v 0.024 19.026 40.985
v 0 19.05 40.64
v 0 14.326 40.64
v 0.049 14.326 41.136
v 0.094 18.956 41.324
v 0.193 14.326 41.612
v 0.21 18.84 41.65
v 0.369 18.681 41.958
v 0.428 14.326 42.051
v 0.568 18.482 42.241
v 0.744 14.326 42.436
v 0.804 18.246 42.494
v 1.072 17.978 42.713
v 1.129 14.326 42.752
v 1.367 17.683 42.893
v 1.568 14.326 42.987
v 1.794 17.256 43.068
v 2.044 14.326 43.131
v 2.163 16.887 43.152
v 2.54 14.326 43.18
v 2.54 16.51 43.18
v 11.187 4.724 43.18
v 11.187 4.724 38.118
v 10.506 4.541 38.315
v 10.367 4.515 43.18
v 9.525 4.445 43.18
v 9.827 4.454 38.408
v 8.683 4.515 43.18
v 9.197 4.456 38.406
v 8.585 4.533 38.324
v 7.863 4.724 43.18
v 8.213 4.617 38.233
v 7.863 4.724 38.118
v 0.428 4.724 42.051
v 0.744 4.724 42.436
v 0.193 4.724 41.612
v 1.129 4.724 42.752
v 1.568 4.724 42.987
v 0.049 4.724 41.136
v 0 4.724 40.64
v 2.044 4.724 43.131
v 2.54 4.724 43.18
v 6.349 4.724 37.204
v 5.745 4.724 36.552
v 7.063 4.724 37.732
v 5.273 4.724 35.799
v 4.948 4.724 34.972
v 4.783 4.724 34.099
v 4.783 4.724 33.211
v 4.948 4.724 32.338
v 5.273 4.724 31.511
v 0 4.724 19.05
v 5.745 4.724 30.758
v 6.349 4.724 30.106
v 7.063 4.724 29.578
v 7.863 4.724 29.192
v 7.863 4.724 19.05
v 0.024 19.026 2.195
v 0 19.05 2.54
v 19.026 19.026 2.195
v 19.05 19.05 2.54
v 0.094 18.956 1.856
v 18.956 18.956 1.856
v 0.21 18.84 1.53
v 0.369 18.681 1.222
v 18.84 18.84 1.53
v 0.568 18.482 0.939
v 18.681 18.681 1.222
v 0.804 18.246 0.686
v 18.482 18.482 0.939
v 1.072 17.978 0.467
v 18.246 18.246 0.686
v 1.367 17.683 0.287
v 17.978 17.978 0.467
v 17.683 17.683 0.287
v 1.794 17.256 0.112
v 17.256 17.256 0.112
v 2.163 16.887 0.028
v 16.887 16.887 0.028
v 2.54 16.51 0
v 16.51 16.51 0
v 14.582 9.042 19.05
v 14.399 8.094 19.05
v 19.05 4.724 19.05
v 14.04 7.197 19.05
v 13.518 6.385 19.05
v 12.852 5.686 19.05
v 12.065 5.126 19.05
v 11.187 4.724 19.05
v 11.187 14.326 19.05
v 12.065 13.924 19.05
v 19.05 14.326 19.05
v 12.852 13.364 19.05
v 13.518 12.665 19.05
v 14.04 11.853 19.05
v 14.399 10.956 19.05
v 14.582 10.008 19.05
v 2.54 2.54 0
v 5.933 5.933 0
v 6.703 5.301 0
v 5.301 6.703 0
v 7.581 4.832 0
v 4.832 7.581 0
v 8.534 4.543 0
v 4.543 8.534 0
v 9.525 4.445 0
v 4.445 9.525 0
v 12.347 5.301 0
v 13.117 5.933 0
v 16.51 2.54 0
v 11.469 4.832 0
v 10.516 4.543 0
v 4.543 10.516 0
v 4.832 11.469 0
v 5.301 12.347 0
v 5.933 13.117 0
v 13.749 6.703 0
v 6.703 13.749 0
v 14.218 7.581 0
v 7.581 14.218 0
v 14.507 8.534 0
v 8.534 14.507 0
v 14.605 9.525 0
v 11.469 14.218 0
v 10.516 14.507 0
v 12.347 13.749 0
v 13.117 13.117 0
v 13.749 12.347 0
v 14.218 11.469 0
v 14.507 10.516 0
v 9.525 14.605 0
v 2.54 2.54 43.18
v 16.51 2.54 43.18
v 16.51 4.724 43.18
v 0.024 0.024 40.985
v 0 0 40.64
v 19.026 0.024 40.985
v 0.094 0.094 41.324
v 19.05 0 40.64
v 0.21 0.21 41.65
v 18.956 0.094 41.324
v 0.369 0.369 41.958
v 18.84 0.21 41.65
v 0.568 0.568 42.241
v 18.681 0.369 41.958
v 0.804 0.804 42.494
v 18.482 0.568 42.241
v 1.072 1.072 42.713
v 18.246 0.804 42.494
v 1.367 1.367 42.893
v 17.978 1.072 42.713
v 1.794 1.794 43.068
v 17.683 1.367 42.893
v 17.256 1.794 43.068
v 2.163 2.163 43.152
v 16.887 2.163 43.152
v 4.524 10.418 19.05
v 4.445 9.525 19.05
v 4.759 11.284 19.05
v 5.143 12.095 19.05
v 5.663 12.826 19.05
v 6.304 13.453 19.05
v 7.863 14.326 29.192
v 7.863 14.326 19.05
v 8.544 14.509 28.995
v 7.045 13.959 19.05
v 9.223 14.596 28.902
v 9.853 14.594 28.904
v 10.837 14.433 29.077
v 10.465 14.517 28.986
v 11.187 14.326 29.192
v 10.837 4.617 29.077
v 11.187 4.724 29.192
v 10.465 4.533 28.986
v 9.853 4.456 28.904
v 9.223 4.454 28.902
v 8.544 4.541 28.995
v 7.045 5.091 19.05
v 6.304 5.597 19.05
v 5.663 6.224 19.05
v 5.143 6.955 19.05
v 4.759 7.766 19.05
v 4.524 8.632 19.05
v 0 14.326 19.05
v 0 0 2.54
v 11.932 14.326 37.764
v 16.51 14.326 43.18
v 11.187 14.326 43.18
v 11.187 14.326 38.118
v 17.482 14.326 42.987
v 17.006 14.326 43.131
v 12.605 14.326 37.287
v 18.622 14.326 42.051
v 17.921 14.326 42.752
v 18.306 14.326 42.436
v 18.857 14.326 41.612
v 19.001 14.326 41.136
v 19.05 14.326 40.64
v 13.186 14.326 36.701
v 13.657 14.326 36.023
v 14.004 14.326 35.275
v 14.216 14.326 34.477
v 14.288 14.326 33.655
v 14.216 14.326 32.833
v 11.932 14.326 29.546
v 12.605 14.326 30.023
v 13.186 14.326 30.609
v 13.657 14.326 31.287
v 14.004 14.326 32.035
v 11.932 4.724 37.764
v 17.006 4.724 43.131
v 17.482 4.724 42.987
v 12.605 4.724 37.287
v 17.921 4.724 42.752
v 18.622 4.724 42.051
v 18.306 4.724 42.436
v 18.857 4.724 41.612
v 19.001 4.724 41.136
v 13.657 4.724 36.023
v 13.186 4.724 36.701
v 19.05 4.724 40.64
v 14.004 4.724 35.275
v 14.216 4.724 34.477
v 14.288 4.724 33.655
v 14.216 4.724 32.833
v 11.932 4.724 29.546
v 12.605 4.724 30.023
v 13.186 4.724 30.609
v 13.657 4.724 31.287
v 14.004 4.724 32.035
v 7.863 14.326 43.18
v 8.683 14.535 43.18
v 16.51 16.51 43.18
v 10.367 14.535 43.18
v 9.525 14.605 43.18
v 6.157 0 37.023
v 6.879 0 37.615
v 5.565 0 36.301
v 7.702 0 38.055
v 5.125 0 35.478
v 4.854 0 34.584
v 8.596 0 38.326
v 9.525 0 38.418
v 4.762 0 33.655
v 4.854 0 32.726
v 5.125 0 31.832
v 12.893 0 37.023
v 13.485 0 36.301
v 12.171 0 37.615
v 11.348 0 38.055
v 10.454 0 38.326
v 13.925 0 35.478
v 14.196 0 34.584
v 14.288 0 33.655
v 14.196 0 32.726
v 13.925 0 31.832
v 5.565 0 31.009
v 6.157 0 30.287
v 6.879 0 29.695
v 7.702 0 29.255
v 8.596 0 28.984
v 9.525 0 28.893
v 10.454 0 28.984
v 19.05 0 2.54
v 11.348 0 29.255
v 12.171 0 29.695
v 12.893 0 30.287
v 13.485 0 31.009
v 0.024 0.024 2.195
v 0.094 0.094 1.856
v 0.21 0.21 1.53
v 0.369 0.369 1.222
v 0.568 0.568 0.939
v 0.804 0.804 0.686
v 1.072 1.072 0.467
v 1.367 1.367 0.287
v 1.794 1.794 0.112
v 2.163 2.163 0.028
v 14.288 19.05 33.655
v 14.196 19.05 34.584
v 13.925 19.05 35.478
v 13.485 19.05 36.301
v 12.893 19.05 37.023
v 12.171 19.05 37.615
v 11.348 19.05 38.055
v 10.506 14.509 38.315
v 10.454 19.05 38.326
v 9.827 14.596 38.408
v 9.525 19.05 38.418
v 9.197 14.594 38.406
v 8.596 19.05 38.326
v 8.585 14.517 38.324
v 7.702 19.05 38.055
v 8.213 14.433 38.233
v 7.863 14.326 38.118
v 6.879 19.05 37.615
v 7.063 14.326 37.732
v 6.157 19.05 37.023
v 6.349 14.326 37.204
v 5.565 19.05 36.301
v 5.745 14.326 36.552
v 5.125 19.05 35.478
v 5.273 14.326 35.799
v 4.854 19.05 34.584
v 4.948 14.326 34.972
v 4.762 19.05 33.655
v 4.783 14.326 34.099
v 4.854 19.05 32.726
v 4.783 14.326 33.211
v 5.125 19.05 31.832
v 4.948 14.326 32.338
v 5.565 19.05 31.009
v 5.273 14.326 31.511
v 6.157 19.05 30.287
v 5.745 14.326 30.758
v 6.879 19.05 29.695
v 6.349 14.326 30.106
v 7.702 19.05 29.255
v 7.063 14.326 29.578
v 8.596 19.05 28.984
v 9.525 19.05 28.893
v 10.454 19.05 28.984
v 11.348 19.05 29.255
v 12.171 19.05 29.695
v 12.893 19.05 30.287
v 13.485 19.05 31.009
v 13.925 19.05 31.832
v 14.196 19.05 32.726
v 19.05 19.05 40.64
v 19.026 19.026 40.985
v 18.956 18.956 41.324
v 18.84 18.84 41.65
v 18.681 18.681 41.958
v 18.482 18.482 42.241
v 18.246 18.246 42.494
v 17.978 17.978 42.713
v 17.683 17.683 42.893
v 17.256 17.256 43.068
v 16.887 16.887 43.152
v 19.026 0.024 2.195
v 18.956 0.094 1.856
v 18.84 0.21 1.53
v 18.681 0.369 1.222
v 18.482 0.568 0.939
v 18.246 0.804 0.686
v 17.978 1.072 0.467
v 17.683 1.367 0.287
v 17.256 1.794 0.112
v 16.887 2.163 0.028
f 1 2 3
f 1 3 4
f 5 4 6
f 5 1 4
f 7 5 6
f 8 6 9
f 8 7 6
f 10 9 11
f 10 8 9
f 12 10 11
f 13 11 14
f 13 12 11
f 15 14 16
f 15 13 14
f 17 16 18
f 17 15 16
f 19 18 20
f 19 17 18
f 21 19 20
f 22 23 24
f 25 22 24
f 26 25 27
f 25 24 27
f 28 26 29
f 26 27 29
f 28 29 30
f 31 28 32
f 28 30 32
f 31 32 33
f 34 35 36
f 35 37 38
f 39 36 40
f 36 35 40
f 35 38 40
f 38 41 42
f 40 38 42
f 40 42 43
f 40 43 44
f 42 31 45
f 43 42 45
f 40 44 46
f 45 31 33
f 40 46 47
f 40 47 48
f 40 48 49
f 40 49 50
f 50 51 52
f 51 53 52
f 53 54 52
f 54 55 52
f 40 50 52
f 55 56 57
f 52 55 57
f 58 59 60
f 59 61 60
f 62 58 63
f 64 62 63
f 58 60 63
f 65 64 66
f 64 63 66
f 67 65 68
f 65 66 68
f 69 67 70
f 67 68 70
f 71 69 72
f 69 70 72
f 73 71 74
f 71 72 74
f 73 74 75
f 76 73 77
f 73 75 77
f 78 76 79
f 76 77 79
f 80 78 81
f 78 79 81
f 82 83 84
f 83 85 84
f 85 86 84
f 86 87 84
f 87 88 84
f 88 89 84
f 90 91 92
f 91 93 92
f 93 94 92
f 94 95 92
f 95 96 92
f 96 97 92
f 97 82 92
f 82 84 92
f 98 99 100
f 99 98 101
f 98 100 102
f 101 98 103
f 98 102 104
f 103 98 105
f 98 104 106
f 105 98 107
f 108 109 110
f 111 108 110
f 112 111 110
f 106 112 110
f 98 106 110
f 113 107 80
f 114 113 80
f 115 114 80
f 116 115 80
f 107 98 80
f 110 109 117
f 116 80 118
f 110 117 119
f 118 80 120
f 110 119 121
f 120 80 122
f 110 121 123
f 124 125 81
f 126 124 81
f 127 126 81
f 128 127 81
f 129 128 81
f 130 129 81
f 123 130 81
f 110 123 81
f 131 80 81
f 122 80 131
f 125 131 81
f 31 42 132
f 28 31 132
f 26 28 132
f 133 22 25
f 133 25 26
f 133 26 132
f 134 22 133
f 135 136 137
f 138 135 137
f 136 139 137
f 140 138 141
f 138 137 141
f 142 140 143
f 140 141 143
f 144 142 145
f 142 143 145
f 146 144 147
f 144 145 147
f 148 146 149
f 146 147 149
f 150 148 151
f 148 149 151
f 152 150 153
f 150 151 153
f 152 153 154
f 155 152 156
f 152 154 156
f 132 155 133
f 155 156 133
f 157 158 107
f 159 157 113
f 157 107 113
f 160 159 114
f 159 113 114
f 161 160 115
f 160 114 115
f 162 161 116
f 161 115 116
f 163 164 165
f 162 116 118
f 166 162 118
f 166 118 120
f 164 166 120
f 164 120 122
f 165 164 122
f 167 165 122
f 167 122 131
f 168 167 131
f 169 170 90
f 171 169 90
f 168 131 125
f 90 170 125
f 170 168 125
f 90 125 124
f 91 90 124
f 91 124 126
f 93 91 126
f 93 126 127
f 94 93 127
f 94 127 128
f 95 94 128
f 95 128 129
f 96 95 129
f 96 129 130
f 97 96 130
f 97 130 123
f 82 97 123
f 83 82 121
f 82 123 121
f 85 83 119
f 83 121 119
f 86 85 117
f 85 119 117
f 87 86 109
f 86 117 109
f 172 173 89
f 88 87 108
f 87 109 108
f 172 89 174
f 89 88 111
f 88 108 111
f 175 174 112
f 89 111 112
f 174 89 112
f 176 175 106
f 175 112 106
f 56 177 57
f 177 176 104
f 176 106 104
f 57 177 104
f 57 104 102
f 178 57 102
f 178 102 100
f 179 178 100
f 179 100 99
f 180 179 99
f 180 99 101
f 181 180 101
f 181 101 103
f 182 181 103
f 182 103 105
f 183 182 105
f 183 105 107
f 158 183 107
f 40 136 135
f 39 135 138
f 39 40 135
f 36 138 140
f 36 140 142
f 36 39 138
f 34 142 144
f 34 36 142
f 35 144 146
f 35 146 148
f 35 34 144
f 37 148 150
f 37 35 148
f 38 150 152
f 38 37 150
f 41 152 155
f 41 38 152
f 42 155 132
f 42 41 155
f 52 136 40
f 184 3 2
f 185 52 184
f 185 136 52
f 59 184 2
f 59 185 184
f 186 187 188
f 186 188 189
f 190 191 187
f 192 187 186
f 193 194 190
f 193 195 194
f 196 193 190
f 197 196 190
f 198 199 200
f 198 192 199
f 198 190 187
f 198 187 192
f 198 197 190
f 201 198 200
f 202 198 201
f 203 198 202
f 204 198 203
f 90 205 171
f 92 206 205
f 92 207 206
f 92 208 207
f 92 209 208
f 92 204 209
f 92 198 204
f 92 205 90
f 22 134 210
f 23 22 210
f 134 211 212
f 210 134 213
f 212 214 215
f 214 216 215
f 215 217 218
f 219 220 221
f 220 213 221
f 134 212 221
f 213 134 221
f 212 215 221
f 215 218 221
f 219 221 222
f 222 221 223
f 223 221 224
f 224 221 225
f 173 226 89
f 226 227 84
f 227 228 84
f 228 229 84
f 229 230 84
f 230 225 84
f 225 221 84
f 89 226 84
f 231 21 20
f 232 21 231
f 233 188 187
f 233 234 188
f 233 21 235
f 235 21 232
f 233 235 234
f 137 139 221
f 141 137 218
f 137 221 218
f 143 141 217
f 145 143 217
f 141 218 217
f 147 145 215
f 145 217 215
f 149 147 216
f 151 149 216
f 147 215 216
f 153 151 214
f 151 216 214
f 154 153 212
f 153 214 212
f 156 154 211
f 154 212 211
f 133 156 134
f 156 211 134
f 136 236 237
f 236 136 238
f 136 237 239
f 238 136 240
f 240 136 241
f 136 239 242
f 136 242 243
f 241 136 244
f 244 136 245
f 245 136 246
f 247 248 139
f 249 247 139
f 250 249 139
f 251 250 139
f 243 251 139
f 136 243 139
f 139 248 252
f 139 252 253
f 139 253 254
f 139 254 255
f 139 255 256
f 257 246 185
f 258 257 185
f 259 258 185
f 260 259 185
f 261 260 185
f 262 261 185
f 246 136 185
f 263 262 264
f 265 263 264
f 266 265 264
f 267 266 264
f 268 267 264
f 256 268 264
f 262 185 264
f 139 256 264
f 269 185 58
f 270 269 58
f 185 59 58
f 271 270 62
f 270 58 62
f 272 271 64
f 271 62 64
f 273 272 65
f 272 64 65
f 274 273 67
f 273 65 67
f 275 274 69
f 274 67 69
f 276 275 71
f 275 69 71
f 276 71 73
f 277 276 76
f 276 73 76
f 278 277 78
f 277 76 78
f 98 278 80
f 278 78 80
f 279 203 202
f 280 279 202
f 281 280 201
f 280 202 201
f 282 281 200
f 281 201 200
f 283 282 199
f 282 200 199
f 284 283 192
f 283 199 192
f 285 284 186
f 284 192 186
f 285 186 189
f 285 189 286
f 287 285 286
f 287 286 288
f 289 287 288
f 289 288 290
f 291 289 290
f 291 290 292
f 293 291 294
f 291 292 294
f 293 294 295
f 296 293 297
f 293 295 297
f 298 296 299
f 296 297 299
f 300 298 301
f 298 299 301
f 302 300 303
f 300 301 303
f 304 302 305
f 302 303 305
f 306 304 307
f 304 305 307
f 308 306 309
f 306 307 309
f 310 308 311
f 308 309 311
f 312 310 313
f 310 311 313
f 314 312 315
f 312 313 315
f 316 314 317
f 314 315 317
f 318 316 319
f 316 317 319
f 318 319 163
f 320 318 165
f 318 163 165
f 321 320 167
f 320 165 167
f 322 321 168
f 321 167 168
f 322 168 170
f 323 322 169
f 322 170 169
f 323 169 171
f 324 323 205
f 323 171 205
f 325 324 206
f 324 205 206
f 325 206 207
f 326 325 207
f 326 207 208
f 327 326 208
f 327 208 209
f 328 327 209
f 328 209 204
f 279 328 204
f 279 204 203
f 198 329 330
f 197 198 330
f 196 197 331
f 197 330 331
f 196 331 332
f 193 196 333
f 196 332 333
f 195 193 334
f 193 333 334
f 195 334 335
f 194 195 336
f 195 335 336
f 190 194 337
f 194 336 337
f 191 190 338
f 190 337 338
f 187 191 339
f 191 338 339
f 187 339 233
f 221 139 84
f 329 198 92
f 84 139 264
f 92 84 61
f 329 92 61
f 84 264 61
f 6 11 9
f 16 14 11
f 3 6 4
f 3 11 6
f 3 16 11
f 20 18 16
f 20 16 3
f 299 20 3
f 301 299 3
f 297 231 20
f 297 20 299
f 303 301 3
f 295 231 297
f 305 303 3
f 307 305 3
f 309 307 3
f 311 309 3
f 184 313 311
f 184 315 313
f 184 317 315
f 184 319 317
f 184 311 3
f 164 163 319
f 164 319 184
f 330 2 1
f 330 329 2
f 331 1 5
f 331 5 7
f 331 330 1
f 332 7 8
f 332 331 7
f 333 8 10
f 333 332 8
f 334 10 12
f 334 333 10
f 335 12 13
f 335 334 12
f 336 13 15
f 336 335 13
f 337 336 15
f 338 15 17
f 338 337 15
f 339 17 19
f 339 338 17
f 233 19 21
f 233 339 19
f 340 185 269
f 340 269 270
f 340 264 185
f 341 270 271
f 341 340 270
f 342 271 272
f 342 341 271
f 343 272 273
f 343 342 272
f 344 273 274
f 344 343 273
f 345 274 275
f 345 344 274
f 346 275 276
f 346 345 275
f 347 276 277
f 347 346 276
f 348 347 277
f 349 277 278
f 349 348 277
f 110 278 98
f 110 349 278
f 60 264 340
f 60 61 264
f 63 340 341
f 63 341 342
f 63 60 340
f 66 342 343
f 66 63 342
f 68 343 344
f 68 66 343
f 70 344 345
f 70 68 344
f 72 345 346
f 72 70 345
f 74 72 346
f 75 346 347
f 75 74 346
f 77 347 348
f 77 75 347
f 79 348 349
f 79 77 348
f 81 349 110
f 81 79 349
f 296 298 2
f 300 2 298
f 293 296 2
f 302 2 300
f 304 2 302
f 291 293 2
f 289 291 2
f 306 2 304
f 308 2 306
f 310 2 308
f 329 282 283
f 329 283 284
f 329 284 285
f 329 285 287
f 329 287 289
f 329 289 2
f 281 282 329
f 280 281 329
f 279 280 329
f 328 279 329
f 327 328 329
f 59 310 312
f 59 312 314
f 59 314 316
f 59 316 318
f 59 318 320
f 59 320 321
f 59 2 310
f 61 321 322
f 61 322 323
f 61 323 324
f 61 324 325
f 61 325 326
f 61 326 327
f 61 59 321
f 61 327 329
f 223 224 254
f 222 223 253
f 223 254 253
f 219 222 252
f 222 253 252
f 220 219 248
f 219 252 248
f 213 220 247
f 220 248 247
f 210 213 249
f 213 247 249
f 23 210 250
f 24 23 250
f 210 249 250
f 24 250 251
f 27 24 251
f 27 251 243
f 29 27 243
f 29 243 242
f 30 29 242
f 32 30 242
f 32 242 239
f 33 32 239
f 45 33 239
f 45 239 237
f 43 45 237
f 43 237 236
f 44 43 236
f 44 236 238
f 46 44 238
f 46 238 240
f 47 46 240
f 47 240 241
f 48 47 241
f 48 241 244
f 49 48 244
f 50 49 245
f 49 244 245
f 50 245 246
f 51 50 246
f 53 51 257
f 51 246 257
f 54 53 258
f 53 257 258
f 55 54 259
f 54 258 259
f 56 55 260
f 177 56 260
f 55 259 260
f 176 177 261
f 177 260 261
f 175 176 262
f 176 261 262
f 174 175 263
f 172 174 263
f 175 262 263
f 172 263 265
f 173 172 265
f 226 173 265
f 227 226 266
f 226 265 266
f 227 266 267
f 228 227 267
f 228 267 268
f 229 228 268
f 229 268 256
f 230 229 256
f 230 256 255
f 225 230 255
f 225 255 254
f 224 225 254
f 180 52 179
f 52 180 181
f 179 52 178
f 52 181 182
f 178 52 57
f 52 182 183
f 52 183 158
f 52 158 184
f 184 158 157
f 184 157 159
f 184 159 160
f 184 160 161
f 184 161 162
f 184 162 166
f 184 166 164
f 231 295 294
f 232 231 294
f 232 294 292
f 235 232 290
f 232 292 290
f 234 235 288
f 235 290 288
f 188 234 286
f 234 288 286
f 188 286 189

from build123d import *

# Parameters (mm, degrees)
SKETCH1_W           = 19.05
SKETCH1_H           = 19.05
BOSS_EXTRUDE1_DEPTH = 43.18
FILLET1_R           = 2.54
CUT_EXTRUDE1_REACH  = 45.18
SKETCH2_R           = 5.08
SKETCH3_W           = 43.18
SKETCH3_H           = 9.6012
CUT_EXTRUDE2_DEPTH  = 20.05
SKETCH4_R           = 4.7625
CUT_EXTRUDE3_DEPTH  = 20.05


with BuildPart() as part:
    # Sketch1 → Boss-Extrude1 (new body)
    with BuildSketch(Plane.XY):
        with Locations((9.525, 9.525)):
            Rectangle(SKETCH1_W, SKETCH1_H)
    extrude(amount=BOSS_EXTRUDE1_DEPTH)

    # Fillet1
    fillet1_edges = [part.edges().sort_by_distance(p)[0] for p in [
        (19.05, 9.525, 43.18),
        (9.525, 19.05, 43.18),
        (0, 9.525, 43.18),
        (9.525, 19.05, 0),
        (19.05, 9.525, 0),
        (9.525, 0, 0),
        (0, 9.525, 0),
        (9.525, 0, 43.18),
    ]]
    fillet(fillet1_edges, radius=FILLET1_R)

    # Sketch2 → Cut-Extrude1 (cut, up to next)
    with BuildSketch(Plane(origin=(0, 0, 0), x_dir=(-1, 0, 0), z_dir=(0, 0, -1)), mode=Mode.PRIVATE) as cut_extrude1_sk1:
        with Locations((-9.525, 9.525)):
            Circle(SKETCH2_R)
    cut_extrude1_tool1 = extrude(cut_extrude1_sk1.sketch, amount=-CUT_EXTRUDE1_REACH, mode=Mode.PRIVATE) & part.part
    add(cut_extrude1_tool1.solids().sort_by_distance((9.525, 9.525, 0))[0], mode=Mode.SUBTRACT)

    # Sketch3 → Cut-Extrude2 (cut, through all)
    with BuildSketch(Plane(origin=(19.05, 0, 0), x_dir=(0, 0, -1), z_dir=(1, 0, 0))):
        with Locations((-40.64, 9.525)):
            Rectangle(SKETCH3_W, SKETCH3_H)
    extrude(amount=-CUT_EXTRUDE2_DEPTH, mode=Mode.SUBTRACT)

    # Sketch4 → Cut-Extrude3 (cut, through all)
    with BuildSketch(Plane.XZ):
        with Locations((9.525, 33.655)):
            Circle(SKETCH4_R)
    extrude(amount=-CUT_EXTRUDE3_DEPTH, mode=Mode.SUBTRACT)


solid = part.part
